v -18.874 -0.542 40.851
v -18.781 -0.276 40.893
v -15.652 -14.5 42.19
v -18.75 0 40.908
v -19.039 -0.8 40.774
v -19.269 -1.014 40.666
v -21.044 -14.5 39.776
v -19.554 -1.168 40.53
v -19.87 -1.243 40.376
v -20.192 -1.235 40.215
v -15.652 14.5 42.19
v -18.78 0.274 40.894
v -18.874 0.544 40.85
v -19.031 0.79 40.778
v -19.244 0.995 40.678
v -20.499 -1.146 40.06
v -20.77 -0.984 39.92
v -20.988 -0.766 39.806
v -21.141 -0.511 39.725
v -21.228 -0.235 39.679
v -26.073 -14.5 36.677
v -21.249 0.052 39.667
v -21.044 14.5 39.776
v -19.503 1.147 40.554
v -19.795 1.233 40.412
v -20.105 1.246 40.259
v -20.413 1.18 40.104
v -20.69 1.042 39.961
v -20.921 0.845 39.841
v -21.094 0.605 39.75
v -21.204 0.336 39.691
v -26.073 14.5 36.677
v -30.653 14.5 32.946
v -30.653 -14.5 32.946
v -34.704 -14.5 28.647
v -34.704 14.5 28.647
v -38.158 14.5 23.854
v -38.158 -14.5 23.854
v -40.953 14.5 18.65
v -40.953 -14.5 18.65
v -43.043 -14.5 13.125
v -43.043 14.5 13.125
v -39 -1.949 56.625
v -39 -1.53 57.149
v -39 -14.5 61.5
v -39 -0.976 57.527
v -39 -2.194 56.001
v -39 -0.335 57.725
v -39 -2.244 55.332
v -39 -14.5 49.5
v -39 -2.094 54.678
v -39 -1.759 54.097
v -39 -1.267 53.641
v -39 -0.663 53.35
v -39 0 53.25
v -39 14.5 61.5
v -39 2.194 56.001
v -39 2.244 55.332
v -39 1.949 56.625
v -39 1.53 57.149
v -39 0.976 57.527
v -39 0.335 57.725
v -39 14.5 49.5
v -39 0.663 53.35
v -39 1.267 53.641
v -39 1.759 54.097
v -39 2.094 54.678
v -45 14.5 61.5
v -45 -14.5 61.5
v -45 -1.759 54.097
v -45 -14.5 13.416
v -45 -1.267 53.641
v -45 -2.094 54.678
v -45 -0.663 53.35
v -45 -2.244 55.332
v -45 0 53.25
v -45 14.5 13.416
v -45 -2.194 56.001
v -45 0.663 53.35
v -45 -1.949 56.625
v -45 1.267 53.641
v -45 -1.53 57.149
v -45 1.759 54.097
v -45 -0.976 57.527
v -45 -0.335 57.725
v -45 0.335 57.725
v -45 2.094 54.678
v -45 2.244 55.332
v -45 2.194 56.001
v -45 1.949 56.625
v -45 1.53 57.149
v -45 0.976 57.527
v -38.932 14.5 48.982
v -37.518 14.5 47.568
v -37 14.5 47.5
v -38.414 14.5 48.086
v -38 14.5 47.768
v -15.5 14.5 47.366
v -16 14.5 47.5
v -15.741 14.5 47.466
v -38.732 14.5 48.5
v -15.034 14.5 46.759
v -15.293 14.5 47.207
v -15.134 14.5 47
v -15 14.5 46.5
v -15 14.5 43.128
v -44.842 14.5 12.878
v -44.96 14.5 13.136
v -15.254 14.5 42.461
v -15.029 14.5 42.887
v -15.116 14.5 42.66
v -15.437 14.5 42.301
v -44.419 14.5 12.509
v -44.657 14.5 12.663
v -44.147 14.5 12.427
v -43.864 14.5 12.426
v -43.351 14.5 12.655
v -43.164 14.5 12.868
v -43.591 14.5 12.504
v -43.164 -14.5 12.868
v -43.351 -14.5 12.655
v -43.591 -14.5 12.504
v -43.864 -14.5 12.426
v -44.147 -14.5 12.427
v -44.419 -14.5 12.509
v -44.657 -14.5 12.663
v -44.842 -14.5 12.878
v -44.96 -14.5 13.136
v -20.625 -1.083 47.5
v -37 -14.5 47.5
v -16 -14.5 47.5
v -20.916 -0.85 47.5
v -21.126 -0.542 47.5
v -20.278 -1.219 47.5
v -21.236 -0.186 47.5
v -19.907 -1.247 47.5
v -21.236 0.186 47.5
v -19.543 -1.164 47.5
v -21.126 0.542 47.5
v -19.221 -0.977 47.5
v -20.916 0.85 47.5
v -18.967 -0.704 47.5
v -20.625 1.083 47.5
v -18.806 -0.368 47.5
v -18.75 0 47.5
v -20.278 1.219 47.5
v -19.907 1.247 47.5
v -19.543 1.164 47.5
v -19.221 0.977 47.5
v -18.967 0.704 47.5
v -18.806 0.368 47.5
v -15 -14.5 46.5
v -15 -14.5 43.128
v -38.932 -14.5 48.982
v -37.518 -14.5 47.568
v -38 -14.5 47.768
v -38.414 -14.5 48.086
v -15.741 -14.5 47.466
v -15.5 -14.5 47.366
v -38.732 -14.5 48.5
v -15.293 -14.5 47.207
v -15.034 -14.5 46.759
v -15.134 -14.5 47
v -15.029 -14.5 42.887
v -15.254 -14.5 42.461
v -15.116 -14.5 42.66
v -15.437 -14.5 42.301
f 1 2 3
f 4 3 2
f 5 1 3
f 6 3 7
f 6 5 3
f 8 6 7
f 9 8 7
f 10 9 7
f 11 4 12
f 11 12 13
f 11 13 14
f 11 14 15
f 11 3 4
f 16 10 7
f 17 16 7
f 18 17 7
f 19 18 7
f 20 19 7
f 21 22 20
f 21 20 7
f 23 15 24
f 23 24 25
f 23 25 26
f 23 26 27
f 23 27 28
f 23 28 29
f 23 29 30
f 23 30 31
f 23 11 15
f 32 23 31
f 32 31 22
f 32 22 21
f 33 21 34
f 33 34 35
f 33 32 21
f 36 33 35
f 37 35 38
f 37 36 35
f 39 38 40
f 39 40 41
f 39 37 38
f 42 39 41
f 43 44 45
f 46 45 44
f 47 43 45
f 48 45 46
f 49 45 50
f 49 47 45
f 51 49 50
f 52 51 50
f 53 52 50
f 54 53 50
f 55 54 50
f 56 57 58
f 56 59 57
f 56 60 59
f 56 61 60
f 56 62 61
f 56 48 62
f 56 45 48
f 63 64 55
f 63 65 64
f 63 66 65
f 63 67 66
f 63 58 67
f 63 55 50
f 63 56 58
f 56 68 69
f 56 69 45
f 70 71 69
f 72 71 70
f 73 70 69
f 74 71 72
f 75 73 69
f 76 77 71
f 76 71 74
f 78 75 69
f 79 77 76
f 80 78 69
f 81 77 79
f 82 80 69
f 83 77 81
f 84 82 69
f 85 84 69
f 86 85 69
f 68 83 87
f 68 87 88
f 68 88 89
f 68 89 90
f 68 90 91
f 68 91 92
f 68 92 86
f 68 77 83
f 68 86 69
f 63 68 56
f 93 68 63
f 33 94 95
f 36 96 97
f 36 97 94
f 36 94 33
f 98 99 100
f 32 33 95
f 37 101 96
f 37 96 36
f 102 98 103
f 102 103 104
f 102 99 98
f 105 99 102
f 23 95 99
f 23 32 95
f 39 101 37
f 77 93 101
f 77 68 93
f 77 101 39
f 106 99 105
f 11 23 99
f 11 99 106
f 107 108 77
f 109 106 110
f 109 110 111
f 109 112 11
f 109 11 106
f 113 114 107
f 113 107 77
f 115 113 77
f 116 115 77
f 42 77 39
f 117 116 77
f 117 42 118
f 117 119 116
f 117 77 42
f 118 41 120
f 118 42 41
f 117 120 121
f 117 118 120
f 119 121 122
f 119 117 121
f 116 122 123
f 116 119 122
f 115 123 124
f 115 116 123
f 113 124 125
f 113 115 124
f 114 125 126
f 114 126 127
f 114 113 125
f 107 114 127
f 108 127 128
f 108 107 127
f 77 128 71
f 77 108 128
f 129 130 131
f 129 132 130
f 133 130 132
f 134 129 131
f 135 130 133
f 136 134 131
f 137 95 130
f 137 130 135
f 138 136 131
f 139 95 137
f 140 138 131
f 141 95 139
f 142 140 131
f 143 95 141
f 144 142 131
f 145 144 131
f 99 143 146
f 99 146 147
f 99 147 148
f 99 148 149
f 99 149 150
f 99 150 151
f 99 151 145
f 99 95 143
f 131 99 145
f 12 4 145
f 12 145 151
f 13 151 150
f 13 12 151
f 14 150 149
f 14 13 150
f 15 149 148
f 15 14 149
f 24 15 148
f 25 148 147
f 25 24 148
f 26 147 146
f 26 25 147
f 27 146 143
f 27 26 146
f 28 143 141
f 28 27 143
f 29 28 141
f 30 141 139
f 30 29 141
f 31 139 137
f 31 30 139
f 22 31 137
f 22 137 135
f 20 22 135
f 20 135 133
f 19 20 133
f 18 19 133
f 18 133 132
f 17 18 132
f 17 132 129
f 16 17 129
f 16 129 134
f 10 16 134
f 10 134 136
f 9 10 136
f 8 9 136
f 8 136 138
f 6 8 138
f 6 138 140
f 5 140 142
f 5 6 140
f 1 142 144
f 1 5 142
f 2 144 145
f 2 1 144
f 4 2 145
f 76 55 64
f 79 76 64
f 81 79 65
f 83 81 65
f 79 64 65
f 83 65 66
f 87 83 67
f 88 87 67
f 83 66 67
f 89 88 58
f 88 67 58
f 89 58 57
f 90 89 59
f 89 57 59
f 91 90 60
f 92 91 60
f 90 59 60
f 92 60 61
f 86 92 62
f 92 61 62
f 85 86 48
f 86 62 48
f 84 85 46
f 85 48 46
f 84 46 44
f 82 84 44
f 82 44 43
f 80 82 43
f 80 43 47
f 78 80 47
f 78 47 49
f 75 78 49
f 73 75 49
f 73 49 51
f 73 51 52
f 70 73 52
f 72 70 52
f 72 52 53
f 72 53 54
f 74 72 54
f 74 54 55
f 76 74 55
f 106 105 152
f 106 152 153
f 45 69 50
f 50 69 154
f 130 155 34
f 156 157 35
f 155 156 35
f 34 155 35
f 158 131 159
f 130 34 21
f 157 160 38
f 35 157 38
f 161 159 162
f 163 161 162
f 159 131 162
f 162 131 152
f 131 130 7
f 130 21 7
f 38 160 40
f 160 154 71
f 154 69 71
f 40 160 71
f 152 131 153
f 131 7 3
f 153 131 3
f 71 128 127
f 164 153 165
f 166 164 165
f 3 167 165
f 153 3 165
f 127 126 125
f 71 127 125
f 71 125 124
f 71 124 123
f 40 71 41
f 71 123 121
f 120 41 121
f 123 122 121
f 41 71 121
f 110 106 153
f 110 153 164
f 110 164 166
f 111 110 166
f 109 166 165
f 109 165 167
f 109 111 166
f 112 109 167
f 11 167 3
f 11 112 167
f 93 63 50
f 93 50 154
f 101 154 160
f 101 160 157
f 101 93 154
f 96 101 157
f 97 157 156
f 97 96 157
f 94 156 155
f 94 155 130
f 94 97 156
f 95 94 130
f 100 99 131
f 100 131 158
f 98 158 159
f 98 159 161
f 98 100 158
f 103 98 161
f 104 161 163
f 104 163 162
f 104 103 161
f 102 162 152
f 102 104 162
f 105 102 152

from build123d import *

# Parameters (mm, degrees)
BOSS_EXTRUDE1_DEPTH     = 14.5
SKETCH2_R               = 2.25
CUT_EXTRUDE1_DEPTH      = 68.590679831
CUT_EXTRUDE2_DEPTH      = 59.873665056
CUT_EXTRUDE2_DEPTH_BACK = 59.873665056
SKETCH3_R               = 1.25


with BuildPart() as part:
    # Sketch1 → Boss-Extrude1 (new, symmetric)
    with BuildSketch(Plane(origin=(0, 0, 0), x_dir=(1, 0, 0), z_dir=(0, 1, 0))):
        with BuildLine():
            Line((-45, -13.416407865), (-45, -61.5))
            Line((-45, -61.5), (-39, -61.5))
            Line((-39, -61.5), (-39, -49.5))
            ThreePointArc((-39, -49.5), (-38.414213562, -48.085786438), (-37, -47.5))
            Line((-37, -47.5), (-16, -47.5))
            ThreePointArc((-16, -47.5), (-15.292893219, -47.207106781), (-15, -46.5))
            Line((-15, -46.5), (-15, -43.127717306))
            ThreePointArc((-15, -43.127717306), (-15.179077931, -42.556677065), (-15.652173913, -42.190158234))
            ThreePointArc((-15.652173913, -42.190158234), (-32.748960764, -30.862688944), (-43.043478261, -13.124746824))
            ThreePointArc((-43.043478261, -13.124746824), (-44.147441956, -12.427337155), (-45, -13.416407865))
        make_face()
    extrude(amount=BOSS_EXTRUDE1_DEPTH, both=True)

    # Sketch2 → Cut-Extrude1 (cut, through all)
    with BuildSketch(Plane(origin=(-39, 0, 0), x_dir=(0, 0, -1), z_dir=(1, 0, 0))):
        with Locations((-55.5, 0)):
            Circle(SKETCH2_R)
    extrude(amount=-CUT_EXTRUDE1_DEPTH, mode=Mode.SUBTRACT)

    # Sketch3 → Cut-Extrude2 (cut, two sides: drawn at the far end of the back side and taken through both)
    with BuildSketch(Plane.XY.offset(47.5).offset(-CUT_EXTRUDE2_DEPTH_BACK)):
        with Locations((-20, 0)):
            Circle(SKETCH3_R)
    extrude(amount=CUT_EXTRUDE2_DEPTH + CUT_EXTRUDE2_DEPTH_BACK, mode=Mode.SUBTRACT)


solid = part.part
